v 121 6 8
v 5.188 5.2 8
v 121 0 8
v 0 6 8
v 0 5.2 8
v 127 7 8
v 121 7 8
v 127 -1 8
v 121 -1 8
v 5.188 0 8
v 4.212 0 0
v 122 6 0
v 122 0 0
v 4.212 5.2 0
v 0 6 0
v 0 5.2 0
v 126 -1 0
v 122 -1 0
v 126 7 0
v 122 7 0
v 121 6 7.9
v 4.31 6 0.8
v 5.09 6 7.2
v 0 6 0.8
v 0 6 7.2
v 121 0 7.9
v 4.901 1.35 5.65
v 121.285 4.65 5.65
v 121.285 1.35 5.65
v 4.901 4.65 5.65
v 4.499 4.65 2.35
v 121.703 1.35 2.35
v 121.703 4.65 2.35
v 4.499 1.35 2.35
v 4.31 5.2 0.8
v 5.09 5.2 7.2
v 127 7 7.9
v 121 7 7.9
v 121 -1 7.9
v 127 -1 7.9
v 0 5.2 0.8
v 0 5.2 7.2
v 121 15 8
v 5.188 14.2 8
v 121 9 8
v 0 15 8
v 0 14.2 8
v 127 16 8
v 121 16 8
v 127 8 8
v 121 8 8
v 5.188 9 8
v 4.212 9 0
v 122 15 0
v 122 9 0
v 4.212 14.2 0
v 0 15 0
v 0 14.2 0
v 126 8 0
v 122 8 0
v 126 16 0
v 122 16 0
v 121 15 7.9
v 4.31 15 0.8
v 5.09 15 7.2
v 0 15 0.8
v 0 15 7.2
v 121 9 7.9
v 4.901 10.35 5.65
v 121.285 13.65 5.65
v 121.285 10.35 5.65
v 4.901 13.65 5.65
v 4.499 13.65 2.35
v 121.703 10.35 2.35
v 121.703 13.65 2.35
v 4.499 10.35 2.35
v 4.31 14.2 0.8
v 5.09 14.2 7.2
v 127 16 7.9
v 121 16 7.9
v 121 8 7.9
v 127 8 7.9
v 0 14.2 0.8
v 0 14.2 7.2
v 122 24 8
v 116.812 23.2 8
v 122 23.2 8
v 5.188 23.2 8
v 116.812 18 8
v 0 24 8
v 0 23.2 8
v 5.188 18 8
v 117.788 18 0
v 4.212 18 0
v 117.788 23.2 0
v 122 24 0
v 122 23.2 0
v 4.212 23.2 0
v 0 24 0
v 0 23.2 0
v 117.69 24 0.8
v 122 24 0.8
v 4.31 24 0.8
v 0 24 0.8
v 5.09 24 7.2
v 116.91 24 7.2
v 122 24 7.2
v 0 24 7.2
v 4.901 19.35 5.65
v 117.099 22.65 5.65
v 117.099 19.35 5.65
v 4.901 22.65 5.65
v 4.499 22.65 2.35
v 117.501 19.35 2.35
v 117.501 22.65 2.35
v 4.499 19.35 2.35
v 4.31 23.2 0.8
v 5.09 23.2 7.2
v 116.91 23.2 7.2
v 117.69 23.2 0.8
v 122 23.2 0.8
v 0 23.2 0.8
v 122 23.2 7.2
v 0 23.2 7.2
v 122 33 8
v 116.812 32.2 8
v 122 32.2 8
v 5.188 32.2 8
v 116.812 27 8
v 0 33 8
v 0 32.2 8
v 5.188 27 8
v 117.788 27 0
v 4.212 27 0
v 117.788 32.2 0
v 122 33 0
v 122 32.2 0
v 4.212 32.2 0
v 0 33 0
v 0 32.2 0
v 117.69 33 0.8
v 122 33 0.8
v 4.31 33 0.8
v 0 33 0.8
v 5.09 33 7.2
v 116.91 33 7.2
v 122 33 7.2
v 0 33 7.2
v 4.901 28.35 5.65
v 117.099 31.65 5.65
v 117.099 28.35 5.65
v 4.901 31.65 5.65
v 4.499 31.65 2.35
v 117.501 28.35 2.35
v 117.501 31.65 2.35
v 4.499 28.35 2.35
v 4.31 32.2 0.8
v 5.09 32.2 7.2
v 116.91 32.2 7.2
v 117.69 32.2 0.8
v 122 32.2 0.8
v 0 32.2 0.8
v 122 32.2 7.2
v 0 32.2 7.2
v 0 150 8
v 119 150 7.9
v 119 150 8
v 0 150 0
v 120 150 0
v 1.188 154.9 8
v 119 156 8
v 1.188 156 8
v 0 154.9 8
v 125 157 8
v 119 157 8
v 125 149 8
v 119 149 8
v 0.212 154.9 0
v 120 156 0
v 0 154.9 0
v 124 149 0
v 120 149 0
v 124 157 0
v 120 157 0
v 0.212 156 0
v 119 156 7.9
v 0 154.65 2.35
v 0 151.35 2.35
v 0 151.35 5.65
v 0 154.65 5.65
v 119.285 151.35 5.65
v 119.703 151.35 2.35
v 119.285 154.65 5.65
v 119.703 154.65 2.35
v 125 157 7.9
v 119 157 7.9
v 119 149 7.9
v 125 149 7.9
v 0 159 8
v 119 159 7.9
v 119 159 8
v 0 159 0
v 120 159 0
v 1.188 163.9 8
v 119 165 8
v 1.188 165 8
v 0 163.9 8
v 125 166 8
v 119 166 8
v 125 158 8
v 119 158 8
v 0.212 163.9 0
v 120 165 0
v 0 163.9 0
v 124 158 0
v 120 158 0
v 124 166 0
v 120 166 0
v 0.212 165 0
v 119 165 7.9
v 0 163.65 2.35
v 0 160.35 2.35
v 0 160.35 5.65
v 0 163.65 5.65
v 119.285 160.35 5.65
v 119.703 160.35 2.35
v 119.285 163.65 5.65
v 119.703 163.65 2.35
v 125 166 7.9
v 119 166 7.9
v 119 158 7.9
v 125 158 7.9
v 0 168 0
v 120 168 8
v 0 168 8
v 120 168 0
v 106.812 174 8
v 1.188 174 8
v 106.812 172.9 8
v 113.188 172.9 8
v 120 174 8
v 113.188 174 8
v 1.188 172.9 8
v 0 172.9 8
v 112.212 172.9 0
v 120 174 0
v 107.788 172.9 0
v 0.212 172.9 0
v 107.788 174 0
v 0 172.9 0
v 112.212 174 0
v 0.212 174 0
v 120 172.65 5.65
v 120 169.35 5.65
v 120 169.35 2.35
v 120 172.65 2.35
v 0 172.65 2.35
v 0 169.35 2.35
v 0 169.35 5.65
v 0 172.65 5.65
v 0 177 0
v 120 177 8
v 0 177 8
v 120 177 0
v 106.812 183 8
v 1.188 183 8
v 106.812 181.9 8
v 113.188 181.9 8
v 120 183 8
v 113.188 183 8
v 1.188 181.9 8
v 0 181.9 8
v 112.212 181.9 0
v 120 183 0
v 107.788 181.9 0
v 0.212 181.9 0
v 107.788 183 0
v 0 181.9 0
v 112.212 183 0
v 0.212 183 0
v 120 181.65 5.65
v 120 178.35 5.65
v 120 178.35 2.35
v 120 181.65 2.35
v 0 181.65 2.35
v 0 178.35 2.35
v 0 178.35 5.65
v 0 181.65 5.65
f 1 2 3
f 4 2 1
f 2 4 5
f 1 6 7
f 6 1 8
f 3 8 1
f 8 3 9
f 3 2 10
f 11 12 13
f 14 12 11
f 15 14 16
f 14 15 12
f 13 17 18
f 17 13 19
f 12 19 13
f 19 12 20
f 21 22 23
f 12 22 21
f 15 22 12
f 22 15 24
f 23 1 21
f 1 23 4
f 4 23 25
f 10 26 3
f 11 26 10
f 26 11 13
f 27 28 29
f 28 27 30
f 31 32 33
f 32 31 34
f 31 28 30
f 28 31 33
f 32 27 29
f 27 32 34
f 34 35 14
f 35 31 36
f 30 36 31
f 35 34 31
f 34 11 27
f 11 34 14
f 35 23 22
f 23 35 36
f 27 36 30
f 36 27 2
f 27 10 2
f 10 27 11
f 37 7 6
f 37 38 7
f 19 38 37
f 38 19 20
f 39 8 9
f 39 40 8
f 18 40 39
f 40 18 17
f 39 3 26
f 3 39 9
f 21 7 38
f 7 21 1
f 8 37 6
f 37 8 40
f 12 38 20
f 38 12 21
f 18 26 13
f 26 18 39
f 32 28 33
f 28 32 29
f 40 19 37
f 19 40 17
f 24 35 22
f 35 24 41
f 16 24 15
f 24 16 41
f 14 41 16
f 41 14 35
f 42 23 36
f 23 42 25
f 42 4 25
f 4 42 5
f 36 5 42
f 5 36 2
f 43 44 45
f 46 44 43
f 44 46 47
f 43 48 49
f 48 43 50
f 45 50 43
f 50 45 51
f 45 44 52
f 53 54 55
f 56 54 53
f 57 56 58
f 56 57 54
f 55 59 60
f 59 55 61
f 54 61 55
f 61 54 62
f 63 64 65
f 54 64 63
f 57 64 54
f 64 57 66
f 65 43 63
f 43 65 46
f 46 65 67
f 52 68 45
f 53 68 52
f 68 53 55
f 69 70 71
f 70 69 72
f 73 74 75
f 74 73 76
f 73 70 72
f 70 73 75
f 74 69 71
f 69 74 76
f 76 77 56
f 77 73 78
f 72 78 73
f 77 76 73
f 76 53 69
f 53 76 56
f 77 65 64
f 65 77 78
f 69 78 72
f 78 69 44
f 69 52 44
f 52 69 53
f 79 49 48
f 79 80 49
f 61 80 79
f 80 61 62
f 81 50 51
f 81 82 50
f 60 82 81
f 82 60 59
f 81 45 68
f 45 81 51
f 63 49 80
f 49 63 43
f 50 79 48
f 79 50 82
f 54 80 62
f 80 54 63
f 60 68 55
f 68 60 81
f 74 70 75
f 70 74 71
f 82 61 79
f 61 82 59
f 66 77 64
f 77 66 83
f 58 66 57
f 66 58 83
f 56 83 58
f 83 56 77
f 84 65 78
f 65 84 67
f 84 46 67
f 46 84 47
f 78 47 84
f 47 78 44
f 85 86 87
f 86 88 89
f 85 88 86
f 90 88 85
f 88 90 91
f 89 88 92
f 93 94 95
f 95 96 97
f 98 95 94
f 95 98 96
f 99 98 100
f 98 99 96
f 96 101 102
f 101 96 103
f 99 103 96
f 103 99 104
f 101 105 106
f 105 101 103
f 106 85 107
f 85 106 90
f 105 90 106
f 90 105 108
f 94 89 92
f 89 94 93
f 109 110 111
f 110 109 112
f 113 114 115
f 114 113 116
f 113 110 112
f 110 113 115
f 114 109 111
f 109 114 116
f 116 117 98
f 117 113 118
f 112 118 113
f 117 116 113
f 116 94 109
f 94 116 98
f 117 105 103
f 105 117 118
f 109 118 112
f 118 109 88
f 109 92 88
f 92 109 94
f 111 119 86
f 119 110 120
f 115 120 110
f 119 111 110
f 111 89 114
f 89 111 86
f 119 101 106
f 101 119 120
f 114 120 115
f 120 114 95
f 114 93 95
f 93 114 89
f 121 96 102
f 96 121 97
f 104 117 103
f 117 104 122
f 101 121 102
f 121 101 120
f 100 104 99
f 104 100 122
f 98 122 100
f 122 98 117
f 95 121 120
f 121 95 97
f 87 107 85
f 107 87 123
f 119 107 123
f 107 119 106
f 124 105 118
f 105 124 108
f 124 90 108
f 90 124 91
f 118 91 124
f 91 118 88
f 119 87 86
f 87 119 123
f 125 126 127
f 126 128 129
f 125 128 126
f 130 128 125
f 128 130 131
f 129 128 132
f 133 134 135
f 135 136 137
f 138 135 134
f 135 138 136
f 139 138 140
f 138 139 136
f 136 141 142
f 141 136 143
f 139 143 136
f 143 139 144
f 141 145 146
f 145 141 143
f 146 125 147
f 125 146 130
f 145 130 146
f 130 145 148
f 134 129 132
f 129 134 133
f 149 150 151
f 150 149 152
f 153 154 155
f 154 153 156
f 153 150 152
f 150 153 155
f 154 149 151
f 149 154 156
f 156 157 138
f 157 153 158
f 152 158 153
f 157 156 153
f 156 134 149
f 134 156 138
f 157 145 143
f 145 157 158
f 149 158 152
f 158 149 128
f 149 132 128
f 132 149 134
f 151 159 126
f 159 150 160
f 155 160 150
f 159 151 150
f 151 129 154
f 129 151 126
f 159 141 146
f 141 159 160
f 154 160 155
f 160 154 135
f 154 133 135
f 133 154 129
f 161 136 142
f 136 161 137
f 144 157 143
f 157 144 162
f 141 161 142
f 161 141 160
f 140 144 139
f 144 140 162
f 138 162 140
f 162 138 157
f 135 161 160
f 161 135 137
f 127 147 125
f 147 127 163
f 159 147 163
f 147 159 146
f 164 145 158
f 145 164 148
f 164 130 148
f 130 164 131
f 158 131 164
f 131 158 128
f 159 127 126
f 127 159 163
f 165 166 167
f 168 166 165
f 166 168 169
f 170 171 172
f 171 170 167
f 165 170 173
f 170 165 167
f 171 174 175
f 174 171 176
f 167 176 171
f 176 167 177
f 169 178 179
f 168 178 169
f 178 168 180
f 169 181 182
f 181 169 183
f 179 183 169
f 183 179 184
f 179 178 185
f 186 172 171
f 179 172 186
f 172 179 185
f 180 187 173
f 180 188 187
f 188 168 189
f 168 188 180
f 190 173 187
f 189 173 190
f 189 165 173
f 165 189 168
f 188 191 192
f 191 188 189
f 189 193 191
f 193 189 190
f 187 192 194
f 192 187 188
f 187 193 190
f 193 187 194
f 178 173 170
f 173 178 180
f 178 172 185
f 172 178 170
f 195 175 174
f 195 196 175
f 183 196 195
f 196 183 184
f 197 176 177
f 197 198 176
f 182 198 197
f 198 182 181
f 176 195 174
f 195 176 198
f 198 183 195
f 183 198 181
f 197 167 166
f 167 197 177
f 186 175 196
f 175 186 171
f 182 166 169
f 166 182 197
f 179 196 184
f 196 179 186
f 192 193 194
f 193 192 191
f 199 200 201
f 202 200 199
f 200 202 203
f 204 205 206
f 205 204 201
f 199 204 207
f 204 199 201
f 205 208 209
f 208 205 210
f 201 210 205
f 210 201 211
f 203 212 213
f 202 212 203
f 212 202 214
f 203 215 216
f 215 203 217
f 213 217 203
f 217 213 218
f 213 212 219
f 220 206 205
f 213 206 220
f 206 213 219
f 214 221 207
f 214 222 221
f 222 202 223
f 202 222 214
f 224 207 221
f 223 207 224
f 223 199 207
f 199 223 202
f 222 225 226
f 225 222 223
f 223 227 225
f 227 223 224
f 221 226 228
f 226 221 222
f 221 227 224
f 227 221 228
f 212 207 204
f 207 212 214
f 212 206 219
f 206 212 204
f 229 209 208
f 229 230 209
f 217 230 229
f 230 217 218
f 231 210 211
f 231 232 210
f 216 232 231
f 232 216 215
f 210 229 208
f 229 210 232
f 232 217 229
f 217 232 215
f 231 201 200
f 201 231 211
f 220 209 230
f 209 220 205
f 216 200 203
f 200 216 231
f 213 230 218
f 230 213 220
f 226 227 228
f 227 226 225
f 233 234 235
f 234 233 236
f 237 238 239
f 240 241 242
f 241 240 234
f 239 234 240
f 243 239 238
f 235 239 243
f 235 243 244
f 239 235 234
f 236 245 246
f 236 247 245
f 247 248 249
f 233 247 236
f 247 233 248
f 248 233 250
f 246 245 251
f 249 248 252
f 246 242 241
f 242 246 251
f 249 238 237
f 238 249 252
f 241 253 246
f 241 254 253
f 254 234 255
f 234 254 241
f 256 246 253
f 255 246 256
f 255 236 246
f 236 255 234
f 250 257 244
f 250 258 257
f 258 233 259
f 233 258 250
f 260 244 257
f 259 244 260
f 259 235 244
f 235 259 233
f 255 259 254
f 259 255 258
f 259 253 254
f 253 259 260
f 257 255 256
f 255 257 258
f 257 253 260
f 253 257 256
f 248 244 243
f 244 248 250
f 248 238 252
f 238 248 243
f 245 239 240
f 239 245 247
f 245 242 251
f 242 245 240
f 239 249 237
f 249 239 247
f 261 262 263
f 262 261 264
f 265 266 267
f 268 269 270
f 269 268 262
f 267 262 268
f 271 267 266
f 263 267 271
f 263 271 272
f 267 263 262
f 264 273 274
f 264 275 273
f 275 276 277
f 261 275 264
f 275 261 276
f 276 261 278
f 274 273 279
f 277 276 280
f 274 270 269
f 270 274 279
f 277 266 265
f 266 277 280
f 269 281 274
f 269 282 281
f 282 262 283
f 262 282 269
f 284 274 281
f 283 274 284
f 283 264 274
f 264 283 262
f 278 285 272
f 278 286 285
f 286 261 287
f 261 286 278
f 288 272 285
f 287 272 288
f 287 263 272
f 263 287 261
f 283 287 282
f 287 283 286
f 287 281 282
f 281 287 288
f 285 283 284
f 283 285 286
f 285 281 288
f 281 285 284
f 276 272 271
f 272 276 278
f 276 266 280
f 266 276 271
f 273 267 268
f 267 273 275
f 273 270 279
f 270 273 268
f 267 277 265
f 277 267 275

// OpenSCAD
// ============================================================
// PRINT: VEDAÇÃO DIVISÓRIA — 8 segmentos
// Frame que envolve borda do MDF para vedação
// Mesa: 122mm × 72mm — cabe na Ender 3 (200×200mm) ✓
// Tempo estimado: ~1h30
// ============================================================
// 4× horizontais (122mm) + 4× verticais (120mm)
// Encaixes dovetail nos cantos para montagem do frame
// ============================================================

use <SNAP_TAMPA.scad>

gap = 3;
frame_w = 6;

// 4 segmentos horizontais (122mm cada)
for (i = [0:1]) {
    translate([0, i * (frame_w + gap), 0])
        vedacao_segmento_h_a();
}
for (i = [0:1]) {
    translate([0, (2 + i) * (frame_w + gap), 0])
        vedacao_segmento_h_b();
}

// 4 segmentos verticais (120mm cada, rotacionados para deitar)
for (i = [0:1]) {
    translate([0, (4 + i) * (frame_w + gap), 0])
    rotate([0, 0, -90])
    translate([-120, 0, 0])
        vedacao_segmento_v_a();
}
for (i = [0:1]) {
    translate([0, (6 + i) * (frame_w + gap), 0])
    rotate([0, 0, -90])
    translate([-120, 0, 0])
        vedacao_segmento_v_b();
}

// Guia visual da mesa (não imprime)
%translate([0, 0, -0.5])
    cube([200, 200, 0.1]);
